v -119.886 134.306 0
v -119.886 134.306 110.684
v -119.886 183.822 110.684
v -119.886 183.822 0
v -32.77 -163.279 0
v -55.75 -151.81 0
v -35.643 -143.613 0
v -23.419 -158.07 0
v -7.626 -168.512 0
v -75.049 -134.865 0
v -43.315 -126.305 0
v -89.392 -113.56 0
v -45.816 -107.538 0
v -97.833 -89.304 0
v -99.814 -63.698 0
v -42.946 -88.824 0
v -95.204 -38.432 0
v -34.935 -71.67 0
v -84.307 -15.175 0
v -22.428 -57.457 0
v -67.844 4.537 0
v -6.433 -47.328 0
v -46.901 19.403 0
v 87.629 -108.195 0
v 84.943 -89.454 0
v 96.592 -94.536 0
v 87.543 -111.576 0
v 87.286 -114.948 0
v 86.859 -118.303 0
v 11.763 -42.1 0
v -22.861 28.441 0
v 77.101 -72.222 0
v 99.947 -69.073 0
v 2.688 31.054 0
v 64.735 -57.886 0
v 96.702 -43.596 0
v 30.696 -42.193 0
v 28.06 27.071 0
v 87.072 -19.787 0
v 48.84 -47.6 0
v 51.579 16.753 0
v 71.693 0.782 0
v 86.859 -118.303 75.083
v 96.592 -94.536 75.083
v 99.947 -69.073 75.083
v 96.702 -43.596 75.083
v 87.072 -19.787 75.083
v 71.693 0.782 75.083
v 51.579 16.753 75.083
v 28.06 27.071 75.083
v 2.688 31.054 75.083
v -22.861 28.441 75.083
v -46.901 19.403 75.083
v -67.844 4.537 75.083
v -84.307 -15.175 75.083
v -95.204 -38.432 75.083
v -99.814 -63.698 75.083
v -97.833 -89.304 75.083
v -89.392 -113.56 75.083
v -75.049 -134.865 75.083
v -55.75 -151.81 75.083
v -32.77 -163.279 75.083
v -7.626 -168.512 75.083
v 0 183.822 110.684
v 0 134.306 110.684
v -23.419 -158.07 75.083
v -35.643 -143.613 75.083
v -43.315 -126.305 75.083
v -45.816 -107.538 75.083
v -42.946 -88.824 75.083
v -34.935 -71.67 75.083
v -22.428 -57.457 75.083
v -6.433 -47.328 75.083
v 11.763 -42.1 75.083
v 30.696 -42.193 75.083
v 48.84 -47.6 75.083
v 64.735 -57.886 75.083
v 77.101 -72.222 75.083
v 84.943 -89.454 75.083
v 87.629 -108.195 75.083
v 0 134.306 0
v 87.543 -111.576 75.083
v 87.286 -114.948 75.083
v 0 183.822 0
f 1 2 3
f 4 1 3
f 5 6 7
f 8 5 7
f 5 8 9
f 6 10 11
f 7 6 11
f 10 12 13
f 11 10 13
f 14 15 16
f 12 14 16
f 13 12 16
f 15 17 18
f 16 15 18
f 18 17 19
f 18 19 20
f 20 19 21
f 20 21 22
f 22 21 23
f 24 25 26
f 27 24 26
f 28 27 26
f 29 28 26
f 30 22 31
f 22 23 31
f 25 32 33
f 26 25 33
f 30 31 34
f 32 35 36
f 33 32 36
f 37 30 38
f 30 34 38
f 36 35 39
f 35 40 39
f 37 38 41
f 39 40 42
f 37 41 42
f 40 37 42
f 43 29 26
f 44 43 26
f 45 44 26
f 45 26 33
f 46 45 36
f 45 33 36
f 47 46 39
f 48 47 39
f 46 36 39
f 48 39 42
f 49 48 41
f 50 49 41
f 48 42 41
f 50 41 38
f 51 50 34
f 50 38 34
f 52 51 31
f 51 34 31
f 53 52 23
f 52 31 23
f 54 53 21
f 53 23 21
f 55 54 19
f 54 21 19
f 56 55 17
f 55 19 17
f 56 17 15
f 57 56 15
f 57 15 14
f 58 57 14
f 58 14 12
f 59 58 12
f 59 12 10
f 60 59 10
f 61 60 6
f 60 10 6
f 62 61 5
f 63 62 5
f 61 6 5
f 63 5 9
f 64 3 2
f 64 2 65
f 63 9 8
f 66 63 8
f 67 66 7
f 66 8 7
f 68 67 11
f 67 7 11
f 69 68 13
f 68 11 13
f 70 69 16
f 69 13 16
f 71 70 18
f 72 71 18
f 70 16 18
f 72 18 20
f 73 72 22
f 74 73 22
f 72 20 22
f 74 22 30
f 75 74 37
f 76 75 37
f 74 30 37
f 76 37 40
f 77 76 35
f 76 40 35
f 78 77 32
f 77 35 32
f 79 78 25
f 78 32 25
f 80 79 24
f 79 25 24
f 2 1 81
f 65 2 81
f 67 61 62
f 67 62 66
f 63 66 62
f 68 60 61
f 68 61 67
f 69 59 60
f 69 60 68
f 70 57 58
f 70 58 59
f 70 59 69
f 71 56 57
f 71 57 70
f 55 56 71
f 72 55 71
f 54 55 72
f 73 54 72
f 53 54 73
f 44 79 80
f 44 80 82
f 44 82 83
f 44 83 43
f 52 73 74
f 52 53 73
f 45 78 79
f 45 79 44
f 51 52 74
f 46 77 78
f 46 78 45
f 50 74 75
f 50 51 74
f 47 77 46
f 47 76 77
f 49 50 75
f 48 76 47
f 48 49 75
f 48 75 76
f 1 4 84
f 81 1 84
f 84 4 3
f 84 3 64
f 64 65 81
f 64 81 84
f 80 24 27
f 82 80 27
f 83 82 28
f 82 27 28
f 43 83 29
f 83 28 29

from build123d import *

# Parameters (mm, degrees)
F3_DEPTH = 75.0830527395
F4_W     = 119.8862195015
F4_H     = 49.5163053274
F5_DEPTH = 110.6836441904


with BuildPart() as f3:
    # F1 (on Top) → F3 (new body)
    with BuildSketch(Plane.XY):
        with BuildLine():
            ThreePointArc((86.8587927409, -118.30267436), (96.619474573, -94.4309796617), (99.9468854987, -68.8564404845))
            ThreePointArc((99.9468854987, -68.8564404845), (-67.9235324835, 4.4632271078), (-7.6257242735, -168.5119884996))
            ThreePointArc((-7.6257242735, -168.5119884996), (-14.7918290052, -51.8220899042), (87.6288263669, -108.1949099898))
            ThreePointArc((87.6288263669, -108.1949099898), (87.43603945, -113.2634367074), (86.8587927409, -118.30267436))
        make_face()
    extrude(amount=F3_DEPTH)


with BuildPart() as f5:
    # F4 (on Top) → F5 (new body)
    with BuildSketch(Plane.XY):
        with Locations((-59.9431097507, 159.0637043118)):
            Rectangle(F4_W, F4_H)
    extrude(amount=F5_DEPTH)


solid = Compound([f3.part, f5.part])
